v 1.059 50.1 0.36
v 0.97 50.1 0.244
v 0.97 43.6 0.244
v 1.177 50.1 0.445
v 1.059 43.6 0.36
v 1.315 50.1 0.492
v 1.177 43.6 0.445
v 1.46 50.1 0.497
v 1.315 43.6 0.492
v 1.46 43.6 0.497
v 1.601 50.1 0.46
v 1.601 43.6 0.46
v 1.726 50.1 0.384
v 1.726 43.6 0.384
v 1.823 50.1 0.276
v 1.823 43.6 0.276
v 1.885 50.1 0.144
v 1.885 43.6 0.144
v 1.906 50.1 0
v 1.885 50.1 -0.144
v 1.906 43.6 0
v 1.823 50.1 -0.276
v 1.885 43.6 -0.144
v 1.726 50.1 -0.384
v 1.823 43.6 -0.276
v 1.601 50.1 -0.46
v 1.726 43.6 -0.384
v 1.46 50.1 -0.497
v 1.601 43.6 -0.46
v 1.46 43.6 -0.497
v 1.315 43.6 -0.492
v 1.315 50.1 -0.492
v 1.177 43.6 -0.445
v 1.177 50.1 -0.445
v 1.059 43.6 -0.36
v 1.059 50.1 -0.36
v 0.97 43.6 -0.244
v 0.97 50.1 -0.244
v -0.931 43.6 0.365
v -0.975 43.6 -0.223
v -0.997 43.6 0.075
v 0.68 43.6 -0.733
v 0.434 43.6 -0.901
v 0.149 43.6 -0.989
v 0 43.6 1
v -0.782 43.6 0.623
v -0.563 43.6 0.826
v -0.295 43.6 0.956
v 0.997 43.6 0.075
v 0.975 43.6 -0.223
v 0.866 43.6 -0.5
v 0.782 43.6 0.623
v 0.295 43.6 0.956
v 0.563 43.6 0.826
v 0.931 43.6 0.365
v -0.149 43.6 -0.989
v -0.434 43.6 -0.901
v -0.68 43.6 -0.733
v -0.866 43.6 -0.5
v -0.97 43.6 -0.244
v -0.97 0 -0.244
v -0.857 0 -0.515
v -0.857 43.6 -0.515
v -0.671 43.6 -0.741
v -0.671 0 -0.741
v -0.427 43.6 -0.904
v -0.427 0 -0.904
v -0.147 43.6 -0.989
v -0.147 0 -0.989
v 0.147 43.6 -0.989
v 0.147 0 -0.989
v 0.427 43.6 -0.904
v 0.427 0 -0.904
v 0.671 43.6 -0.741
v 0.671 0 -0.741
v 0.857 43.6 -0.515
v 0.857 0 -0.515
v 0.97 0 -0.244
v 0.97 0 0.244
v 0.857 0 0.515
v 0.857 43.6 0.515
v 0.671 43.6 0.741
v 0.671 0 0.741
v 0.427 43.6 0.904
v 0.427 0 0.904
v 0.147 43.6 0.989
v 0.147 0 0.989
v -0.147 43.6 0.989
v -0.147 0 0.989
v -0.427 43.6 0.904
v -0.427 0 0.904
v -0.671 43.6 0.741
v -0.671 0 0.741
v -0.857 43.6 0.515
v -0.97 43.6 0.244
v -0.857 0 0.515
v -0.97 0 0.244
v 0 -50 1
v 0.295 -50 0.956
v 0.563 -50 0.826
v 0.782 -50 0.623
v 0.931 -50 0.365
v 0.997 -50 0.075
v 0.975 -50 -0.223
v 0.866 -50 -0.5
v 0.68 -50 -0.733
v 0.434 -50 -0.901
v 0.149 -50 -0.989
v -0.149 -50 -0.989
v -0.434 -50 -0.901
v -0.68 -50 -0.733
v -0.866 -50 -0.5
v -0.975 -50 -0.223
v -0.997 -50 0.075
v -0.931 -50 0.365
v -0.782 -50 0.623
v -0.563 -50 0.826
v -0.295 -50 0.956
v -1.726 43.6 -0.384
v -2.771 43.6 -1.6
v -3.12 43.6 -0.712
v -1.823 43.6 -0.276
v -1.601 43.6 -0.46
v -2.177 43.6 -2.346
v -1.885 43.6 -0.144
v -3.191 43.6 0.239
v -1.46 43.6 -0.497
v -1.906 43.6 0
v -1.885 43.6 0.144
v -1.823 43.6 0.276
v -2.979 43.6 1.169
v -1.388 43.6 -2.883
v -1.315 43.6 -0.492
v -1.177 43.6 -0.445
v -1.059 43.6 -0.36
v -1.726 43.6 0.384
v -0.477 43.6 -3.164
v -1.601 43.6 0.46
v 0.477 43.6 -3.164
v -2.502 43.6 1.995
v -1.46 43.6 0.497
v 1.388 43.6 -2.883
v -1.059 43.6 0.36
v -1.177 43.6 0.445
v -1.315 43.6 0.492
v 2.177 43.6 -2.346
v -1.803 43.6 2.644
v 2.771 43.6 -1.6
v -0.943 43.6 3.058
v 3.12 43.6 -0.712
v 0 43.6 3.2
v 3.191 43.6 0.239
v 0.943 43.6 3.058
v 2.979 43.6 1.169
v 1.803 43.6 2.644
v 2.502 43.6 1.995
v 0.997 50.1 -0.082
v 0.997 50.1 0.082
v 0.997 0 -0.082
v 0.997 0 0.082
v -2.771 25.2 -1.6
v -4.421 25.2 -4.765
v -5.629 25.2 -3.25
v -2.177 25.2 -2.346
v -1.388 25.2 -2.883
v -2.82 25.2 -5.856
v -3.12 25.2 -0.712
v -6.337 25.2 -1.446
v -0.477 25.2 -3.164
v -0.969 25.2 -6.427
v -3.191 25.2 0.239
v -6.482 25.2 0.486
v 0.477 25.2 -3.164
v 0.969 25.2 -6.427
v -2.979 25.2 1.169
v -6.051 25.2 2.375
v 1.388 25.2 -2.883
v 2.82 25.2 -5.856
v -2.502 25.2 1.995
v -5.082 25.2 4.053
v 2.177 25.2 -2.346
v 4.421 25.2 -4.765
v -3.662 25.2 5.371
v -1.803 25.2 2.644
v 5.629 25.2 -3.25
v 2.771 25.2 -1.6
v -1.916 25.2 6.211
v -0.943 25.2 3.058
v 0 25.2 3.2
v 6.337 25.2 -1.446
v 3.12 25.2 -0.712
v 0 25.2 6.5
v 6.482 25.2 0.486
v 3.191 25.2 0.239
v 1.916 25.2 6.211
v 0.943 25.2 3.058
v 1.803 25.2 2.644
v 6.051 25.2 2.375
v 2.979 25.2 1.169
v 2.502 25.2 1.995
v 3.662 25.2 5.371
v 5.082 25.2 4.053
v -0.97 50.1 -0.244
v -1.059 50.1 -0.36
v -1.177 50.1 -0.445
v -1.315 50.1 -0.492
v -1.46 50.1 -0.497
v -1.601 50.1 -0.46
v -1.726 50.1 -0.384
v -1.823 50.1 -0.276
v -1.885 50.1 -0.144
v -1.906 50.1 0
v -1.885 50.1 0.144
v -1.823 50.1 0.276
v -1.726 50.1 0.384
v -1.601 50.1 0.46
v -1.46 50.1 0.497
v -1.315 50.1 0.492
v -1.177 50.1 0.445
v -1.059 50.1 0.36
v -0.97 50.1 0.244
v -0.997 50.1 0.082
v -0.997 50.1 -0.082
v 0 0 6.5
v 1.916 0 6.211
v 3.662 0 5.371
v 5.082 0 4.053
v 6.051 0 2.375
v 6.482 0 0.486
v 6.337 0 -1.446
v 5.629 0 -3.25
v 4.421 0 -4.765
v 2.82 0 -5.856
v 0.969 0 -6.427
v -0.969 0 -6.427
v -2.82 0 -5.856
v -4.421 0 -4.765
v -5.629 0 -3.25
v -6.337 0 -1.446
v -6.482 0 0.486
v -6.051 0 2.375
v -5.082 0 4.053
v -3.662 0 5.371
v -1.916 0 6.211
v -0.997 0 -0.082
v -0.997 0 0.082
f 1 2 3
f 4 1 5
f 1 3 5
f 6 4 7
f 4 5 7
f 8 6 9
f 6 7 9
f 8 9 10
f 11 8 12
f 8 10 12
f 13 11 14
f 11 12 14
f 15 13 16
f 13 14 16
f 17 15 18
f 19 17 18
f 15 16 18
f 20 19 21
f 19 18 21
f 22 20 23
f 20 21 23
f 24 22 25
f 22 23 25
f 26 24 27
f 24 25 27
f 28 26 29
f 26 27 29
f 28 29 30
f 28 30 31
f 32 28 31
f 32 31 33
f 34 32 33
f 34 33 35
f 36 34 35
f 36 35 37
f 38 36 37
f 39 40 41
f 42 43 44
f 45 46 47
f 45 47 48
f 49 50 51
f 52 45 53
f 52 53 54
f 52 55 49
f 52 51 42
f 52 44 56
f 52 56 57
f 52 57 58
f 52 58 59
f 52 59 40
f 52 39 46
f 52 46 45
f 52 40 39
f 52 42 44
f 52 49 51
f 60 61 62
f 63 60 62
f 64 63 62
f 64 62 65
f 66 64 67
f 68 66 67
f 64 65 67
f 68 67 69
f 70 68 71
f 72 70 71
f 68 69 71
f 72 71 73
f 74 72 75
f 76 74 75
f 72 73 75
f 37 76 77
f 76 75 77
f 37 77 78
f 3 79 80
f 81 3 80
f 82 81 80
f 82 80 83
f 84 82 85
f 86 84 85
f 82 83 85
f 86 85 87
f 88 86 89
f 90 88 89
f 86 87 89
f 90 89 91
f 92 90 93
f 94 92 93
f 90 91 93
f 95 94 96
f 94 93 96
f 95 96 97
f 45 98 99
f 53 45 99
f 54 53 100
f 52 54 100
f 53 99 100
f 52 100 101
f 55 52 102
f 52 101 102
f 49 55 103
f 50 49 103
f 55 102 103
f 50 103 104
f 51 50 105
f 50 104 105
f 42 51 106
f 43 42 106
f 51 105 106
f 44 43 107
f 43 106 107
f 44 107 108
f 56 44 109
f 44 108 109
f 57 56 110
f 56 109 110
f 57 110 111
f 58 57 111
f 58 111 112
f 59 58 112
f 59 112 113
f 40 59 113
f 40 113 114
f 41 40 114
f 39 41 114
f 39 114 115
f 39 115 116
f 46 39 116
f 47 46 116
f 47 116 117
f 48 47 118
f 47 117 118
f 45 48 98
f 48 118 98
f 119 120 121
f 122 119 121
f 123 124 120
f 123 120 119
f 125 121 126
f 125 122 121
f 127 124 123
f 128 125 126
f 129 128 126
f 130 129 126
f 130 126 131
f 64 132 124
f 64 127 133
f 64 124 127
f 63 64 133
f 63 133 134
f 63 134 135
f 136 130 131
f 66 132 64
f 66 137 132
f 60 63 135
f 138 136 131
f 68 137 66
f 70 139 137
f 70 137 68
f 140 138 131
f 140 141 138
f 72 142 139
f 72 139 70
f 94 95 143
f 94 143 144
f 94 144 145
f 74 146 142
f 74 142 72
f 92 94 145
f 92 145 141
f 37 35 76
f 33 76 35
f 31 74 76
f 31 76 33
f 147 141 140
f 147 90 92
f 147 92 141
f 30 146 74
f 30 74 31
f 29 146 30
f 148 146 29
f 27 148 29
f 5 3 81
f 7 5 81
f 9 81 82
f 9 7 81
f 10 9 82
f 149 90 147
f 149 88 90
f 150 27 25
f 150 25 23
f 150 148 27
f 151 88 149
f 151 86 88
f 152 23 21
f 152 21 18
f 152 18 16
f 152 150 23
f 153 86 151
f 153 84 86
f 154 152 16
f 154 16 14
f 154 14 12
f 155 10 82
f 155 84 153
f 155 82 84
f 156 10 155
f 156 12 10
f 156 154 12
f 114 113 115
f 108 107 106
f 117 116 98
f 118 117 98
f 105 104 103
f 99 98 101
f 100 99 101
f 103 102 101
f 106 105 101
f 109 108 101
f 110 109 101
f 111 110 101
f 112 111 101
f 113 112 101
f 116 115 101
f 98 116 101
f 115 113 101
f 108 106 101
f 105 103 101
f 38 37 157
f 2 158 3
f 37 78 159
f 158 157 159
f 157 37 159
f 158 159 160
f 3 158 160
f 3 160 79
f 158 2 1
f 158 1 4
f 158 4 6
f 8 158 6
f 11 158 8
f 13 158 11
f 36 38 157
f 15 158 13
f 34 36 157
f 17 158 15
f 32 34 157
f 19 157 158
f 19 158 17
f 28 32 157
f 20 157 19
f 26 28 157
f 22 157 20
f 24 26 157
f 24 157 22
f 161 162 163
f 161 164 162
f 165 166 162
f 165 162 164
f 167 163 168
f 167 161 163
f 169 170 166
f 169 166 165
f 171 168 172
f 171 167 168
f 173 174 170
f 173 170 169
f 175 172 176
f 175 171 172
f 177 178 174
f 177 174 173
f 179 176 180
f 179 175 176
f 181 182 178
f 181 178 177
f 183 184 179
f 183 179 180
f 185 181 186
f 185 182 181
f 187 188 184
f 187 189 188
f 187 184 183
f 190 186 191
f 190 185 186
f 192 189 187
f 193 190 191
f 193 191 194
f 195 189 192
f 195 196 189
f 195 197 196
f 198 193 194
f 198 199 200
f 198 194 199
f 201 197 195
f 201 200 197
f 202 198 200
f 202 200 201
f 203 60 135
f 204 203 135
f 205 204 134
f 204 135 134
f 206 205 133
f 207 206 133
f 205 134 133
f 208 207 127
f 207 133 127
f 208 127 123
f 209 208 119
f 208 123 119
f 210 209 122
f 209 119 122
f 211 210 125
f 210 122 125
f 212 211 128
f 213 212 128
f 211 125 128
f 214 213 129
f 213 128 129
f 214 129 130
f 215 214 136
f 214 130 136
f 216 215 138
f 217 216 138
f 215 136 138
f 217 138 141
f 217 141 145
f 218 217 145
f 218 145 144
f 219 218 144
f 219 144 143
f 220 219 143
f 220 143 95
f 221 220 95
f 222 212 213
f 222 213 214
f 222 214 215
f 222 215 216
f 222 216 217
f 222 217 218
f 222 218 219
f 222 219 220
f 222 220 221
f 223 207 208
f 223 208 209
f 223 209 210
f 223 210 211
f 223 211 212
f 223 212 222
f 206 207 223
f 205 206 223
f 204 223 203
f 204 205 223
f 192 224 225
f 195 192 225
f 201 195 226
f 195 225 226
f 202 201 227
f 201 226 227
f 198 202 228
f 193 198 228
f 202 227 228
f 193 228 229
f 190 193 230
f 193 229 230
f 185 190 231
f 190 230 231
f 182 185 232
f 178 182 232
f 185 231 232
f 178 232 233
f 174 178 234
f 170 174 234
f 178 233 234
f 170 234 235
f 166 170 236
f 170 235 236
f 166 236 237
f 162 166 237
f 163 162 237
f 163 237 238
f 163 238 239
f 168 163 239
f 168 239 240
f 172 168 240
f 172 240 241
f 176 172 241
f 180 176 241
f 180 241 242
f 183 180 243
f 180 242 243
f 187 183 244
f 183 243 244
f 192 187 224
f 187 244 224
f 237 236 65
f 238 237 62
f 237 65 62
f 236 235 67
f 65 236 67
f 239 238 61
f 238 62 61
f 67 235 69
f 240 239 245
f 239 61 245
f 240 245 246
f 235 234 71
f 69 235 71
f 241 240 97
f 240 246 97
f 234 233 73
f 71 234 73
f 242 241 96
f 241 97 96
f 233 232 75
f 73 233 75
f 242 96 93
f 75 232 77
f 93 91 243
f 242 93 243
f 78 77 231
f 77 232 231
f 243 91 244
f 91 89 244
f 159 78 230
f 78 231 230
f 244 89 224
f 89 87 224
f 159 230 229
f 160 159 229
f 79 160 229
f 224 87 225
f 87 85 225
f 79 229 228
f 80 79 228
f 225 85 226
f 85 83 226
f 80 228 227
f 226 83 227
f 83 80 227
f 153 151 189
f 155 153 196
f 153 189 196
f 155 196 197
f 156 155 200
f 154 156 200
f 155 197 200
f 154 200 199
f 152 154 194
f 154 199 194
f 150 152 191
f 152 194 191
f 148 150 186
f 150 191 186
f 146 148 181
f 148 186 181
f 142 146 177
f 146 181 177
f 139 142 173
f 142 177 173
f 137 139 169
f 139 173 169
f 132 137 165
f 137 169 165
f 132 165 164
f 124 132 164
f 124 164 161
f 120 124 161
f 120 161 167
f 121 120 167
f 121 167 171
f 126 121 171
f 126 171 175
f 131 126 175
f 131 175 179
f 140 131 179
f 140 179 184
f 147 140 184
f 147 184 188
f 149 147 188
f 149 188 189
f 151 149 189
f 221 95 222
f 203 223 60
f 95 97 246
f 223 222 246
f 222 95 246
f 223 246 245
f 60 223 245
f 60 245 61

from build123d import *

# Parameters (mm, degrees)
BOSS_EXTRUDE1_DEPTH      = 50.1
BOSS_EXTRUDE1_2_DEPTH    = 50.1
SKETCH1_3_R              = 3.2
BOSS_EXTRUDE2_DEPTH      = 43.6
SKETCH1_4_R              = 6.5
SKETCH1_4_R_2            = 3.2
BOSS_EXTRUDE3_DEPTH      = 25.2
BOSS_EXTRUDE4_DEPTH      = 43.6
BOSS_EXTRUDE4_DEPTH_BACK = 50
SKETCH1_5_R              = 1


with BuildPart() as part:
    # Sketch1 → Boss-Extrude1 (new body)
    with BuildSketch(Plane(origin=(0, 0, 0), x_dir=(1, 0, 0), z_dir=(0, 1, 0))):
        with BuildLine():
            ThreePointArc((0.96969231, -0.244329336), (1.905929832, 0), (0.96969231, 0.244329336))
            ThreePointArc((0.96969231, 0.244329336), (1, 0), (0.96969231, -0.244329336))
        make_face()
    extrude(amount=BOSS_EXTRUDE1_DEPTH)



with BuildPart() as body_2:
    # Sketch1 → Boss-Extrude1 2 (new body)
    with BuildSketch(Plane(origin=(0, 0, 0), x_dir=(1, 0, 0), z_dir=(0, 1, 0))):
        with BuildLine():
            ThreePointArc((-0.96969231, -0.244329336), (-1, 0), (-0.96969231, 0.244329336))
            ThreePointArc((-0.96969231, 0.244329336), (-1.905929832, 0), (-0.96969231, -0.244329336))
        make_face()
    extrude(amount=BOSS_EXTRUDE1_2_DEPTH)


with BuildPart() as part_1:
    add(part.part)

    add(body_2.part)  # Boss-Extrude2 merges body 2
    # Sketch1<3> → Boss-Extrude2 (add)
    with BuildSketch(Plane(origin=(0, 0, 0), x_dir=(1, 0, 0), z_dir=(0, 1, 0))):
        Circle(SKETCH1_3_R)
        with BuildLine():
            ThreePointArc((0.96969231, 0.244329336), (1.532185998, 0.483796838), (1.905929832, 0))
            ThreePointArc((1.905929832, 0), (1.532185998, -0.483796838), (0.96969231, -0.244329336))
            ThreePointArc((0.96969231, -0.244329336), (0, -1), (-0.96969231, -0.244329336))
            ThreePointArc((-0.96969231, -0.244329336), (-1.905929832, 0), (-0.96969231, 0.244329336))
            ThreePointArc((-0.96969231, 0.244329336), (0, 1), (0.96969231, 0.244329336))
        make_face(mode=Mode.SUBTRACT)
    extrude(amount=BOSS_EXTRUDE2_DEPTH)

    # Sketch1<4> → Boss-Extrude3 (add)
    with BuildSketch(Plane(origin=(0, 0, 0), x_dir=(1, 0, 0), z_dir=(0, 1, 0))):
        Circle(SKETCH1_4_R)
        Circle(SKETCH1_4_R_2, mode=Mode.SUBTRACT)
    extrude(amount=BOSS_EXTRUDE3_DEPTH)


with BuildPart() as body_2_2:
    # Sketch1<5> → Boss-Extrude4 (new, two sides: drawn at the far end of the back side and taken through both)
    with BuildSketch(Plane(origin=(0, 0, 0), x_dir=(1, 0, 0), z_dir=(0, 1, 0)).offset(-BOSS_EXTRUDE4_DEPTH_BACK)):
        Circle(SKETCH1_5_R)
    extrude(amount=BOSS_EXTRUDE4_DEPTH + BOSS_EXTRUDE4_DEPTH_BACK)


solid = Compound([part_1.part, body_2_2.part])
